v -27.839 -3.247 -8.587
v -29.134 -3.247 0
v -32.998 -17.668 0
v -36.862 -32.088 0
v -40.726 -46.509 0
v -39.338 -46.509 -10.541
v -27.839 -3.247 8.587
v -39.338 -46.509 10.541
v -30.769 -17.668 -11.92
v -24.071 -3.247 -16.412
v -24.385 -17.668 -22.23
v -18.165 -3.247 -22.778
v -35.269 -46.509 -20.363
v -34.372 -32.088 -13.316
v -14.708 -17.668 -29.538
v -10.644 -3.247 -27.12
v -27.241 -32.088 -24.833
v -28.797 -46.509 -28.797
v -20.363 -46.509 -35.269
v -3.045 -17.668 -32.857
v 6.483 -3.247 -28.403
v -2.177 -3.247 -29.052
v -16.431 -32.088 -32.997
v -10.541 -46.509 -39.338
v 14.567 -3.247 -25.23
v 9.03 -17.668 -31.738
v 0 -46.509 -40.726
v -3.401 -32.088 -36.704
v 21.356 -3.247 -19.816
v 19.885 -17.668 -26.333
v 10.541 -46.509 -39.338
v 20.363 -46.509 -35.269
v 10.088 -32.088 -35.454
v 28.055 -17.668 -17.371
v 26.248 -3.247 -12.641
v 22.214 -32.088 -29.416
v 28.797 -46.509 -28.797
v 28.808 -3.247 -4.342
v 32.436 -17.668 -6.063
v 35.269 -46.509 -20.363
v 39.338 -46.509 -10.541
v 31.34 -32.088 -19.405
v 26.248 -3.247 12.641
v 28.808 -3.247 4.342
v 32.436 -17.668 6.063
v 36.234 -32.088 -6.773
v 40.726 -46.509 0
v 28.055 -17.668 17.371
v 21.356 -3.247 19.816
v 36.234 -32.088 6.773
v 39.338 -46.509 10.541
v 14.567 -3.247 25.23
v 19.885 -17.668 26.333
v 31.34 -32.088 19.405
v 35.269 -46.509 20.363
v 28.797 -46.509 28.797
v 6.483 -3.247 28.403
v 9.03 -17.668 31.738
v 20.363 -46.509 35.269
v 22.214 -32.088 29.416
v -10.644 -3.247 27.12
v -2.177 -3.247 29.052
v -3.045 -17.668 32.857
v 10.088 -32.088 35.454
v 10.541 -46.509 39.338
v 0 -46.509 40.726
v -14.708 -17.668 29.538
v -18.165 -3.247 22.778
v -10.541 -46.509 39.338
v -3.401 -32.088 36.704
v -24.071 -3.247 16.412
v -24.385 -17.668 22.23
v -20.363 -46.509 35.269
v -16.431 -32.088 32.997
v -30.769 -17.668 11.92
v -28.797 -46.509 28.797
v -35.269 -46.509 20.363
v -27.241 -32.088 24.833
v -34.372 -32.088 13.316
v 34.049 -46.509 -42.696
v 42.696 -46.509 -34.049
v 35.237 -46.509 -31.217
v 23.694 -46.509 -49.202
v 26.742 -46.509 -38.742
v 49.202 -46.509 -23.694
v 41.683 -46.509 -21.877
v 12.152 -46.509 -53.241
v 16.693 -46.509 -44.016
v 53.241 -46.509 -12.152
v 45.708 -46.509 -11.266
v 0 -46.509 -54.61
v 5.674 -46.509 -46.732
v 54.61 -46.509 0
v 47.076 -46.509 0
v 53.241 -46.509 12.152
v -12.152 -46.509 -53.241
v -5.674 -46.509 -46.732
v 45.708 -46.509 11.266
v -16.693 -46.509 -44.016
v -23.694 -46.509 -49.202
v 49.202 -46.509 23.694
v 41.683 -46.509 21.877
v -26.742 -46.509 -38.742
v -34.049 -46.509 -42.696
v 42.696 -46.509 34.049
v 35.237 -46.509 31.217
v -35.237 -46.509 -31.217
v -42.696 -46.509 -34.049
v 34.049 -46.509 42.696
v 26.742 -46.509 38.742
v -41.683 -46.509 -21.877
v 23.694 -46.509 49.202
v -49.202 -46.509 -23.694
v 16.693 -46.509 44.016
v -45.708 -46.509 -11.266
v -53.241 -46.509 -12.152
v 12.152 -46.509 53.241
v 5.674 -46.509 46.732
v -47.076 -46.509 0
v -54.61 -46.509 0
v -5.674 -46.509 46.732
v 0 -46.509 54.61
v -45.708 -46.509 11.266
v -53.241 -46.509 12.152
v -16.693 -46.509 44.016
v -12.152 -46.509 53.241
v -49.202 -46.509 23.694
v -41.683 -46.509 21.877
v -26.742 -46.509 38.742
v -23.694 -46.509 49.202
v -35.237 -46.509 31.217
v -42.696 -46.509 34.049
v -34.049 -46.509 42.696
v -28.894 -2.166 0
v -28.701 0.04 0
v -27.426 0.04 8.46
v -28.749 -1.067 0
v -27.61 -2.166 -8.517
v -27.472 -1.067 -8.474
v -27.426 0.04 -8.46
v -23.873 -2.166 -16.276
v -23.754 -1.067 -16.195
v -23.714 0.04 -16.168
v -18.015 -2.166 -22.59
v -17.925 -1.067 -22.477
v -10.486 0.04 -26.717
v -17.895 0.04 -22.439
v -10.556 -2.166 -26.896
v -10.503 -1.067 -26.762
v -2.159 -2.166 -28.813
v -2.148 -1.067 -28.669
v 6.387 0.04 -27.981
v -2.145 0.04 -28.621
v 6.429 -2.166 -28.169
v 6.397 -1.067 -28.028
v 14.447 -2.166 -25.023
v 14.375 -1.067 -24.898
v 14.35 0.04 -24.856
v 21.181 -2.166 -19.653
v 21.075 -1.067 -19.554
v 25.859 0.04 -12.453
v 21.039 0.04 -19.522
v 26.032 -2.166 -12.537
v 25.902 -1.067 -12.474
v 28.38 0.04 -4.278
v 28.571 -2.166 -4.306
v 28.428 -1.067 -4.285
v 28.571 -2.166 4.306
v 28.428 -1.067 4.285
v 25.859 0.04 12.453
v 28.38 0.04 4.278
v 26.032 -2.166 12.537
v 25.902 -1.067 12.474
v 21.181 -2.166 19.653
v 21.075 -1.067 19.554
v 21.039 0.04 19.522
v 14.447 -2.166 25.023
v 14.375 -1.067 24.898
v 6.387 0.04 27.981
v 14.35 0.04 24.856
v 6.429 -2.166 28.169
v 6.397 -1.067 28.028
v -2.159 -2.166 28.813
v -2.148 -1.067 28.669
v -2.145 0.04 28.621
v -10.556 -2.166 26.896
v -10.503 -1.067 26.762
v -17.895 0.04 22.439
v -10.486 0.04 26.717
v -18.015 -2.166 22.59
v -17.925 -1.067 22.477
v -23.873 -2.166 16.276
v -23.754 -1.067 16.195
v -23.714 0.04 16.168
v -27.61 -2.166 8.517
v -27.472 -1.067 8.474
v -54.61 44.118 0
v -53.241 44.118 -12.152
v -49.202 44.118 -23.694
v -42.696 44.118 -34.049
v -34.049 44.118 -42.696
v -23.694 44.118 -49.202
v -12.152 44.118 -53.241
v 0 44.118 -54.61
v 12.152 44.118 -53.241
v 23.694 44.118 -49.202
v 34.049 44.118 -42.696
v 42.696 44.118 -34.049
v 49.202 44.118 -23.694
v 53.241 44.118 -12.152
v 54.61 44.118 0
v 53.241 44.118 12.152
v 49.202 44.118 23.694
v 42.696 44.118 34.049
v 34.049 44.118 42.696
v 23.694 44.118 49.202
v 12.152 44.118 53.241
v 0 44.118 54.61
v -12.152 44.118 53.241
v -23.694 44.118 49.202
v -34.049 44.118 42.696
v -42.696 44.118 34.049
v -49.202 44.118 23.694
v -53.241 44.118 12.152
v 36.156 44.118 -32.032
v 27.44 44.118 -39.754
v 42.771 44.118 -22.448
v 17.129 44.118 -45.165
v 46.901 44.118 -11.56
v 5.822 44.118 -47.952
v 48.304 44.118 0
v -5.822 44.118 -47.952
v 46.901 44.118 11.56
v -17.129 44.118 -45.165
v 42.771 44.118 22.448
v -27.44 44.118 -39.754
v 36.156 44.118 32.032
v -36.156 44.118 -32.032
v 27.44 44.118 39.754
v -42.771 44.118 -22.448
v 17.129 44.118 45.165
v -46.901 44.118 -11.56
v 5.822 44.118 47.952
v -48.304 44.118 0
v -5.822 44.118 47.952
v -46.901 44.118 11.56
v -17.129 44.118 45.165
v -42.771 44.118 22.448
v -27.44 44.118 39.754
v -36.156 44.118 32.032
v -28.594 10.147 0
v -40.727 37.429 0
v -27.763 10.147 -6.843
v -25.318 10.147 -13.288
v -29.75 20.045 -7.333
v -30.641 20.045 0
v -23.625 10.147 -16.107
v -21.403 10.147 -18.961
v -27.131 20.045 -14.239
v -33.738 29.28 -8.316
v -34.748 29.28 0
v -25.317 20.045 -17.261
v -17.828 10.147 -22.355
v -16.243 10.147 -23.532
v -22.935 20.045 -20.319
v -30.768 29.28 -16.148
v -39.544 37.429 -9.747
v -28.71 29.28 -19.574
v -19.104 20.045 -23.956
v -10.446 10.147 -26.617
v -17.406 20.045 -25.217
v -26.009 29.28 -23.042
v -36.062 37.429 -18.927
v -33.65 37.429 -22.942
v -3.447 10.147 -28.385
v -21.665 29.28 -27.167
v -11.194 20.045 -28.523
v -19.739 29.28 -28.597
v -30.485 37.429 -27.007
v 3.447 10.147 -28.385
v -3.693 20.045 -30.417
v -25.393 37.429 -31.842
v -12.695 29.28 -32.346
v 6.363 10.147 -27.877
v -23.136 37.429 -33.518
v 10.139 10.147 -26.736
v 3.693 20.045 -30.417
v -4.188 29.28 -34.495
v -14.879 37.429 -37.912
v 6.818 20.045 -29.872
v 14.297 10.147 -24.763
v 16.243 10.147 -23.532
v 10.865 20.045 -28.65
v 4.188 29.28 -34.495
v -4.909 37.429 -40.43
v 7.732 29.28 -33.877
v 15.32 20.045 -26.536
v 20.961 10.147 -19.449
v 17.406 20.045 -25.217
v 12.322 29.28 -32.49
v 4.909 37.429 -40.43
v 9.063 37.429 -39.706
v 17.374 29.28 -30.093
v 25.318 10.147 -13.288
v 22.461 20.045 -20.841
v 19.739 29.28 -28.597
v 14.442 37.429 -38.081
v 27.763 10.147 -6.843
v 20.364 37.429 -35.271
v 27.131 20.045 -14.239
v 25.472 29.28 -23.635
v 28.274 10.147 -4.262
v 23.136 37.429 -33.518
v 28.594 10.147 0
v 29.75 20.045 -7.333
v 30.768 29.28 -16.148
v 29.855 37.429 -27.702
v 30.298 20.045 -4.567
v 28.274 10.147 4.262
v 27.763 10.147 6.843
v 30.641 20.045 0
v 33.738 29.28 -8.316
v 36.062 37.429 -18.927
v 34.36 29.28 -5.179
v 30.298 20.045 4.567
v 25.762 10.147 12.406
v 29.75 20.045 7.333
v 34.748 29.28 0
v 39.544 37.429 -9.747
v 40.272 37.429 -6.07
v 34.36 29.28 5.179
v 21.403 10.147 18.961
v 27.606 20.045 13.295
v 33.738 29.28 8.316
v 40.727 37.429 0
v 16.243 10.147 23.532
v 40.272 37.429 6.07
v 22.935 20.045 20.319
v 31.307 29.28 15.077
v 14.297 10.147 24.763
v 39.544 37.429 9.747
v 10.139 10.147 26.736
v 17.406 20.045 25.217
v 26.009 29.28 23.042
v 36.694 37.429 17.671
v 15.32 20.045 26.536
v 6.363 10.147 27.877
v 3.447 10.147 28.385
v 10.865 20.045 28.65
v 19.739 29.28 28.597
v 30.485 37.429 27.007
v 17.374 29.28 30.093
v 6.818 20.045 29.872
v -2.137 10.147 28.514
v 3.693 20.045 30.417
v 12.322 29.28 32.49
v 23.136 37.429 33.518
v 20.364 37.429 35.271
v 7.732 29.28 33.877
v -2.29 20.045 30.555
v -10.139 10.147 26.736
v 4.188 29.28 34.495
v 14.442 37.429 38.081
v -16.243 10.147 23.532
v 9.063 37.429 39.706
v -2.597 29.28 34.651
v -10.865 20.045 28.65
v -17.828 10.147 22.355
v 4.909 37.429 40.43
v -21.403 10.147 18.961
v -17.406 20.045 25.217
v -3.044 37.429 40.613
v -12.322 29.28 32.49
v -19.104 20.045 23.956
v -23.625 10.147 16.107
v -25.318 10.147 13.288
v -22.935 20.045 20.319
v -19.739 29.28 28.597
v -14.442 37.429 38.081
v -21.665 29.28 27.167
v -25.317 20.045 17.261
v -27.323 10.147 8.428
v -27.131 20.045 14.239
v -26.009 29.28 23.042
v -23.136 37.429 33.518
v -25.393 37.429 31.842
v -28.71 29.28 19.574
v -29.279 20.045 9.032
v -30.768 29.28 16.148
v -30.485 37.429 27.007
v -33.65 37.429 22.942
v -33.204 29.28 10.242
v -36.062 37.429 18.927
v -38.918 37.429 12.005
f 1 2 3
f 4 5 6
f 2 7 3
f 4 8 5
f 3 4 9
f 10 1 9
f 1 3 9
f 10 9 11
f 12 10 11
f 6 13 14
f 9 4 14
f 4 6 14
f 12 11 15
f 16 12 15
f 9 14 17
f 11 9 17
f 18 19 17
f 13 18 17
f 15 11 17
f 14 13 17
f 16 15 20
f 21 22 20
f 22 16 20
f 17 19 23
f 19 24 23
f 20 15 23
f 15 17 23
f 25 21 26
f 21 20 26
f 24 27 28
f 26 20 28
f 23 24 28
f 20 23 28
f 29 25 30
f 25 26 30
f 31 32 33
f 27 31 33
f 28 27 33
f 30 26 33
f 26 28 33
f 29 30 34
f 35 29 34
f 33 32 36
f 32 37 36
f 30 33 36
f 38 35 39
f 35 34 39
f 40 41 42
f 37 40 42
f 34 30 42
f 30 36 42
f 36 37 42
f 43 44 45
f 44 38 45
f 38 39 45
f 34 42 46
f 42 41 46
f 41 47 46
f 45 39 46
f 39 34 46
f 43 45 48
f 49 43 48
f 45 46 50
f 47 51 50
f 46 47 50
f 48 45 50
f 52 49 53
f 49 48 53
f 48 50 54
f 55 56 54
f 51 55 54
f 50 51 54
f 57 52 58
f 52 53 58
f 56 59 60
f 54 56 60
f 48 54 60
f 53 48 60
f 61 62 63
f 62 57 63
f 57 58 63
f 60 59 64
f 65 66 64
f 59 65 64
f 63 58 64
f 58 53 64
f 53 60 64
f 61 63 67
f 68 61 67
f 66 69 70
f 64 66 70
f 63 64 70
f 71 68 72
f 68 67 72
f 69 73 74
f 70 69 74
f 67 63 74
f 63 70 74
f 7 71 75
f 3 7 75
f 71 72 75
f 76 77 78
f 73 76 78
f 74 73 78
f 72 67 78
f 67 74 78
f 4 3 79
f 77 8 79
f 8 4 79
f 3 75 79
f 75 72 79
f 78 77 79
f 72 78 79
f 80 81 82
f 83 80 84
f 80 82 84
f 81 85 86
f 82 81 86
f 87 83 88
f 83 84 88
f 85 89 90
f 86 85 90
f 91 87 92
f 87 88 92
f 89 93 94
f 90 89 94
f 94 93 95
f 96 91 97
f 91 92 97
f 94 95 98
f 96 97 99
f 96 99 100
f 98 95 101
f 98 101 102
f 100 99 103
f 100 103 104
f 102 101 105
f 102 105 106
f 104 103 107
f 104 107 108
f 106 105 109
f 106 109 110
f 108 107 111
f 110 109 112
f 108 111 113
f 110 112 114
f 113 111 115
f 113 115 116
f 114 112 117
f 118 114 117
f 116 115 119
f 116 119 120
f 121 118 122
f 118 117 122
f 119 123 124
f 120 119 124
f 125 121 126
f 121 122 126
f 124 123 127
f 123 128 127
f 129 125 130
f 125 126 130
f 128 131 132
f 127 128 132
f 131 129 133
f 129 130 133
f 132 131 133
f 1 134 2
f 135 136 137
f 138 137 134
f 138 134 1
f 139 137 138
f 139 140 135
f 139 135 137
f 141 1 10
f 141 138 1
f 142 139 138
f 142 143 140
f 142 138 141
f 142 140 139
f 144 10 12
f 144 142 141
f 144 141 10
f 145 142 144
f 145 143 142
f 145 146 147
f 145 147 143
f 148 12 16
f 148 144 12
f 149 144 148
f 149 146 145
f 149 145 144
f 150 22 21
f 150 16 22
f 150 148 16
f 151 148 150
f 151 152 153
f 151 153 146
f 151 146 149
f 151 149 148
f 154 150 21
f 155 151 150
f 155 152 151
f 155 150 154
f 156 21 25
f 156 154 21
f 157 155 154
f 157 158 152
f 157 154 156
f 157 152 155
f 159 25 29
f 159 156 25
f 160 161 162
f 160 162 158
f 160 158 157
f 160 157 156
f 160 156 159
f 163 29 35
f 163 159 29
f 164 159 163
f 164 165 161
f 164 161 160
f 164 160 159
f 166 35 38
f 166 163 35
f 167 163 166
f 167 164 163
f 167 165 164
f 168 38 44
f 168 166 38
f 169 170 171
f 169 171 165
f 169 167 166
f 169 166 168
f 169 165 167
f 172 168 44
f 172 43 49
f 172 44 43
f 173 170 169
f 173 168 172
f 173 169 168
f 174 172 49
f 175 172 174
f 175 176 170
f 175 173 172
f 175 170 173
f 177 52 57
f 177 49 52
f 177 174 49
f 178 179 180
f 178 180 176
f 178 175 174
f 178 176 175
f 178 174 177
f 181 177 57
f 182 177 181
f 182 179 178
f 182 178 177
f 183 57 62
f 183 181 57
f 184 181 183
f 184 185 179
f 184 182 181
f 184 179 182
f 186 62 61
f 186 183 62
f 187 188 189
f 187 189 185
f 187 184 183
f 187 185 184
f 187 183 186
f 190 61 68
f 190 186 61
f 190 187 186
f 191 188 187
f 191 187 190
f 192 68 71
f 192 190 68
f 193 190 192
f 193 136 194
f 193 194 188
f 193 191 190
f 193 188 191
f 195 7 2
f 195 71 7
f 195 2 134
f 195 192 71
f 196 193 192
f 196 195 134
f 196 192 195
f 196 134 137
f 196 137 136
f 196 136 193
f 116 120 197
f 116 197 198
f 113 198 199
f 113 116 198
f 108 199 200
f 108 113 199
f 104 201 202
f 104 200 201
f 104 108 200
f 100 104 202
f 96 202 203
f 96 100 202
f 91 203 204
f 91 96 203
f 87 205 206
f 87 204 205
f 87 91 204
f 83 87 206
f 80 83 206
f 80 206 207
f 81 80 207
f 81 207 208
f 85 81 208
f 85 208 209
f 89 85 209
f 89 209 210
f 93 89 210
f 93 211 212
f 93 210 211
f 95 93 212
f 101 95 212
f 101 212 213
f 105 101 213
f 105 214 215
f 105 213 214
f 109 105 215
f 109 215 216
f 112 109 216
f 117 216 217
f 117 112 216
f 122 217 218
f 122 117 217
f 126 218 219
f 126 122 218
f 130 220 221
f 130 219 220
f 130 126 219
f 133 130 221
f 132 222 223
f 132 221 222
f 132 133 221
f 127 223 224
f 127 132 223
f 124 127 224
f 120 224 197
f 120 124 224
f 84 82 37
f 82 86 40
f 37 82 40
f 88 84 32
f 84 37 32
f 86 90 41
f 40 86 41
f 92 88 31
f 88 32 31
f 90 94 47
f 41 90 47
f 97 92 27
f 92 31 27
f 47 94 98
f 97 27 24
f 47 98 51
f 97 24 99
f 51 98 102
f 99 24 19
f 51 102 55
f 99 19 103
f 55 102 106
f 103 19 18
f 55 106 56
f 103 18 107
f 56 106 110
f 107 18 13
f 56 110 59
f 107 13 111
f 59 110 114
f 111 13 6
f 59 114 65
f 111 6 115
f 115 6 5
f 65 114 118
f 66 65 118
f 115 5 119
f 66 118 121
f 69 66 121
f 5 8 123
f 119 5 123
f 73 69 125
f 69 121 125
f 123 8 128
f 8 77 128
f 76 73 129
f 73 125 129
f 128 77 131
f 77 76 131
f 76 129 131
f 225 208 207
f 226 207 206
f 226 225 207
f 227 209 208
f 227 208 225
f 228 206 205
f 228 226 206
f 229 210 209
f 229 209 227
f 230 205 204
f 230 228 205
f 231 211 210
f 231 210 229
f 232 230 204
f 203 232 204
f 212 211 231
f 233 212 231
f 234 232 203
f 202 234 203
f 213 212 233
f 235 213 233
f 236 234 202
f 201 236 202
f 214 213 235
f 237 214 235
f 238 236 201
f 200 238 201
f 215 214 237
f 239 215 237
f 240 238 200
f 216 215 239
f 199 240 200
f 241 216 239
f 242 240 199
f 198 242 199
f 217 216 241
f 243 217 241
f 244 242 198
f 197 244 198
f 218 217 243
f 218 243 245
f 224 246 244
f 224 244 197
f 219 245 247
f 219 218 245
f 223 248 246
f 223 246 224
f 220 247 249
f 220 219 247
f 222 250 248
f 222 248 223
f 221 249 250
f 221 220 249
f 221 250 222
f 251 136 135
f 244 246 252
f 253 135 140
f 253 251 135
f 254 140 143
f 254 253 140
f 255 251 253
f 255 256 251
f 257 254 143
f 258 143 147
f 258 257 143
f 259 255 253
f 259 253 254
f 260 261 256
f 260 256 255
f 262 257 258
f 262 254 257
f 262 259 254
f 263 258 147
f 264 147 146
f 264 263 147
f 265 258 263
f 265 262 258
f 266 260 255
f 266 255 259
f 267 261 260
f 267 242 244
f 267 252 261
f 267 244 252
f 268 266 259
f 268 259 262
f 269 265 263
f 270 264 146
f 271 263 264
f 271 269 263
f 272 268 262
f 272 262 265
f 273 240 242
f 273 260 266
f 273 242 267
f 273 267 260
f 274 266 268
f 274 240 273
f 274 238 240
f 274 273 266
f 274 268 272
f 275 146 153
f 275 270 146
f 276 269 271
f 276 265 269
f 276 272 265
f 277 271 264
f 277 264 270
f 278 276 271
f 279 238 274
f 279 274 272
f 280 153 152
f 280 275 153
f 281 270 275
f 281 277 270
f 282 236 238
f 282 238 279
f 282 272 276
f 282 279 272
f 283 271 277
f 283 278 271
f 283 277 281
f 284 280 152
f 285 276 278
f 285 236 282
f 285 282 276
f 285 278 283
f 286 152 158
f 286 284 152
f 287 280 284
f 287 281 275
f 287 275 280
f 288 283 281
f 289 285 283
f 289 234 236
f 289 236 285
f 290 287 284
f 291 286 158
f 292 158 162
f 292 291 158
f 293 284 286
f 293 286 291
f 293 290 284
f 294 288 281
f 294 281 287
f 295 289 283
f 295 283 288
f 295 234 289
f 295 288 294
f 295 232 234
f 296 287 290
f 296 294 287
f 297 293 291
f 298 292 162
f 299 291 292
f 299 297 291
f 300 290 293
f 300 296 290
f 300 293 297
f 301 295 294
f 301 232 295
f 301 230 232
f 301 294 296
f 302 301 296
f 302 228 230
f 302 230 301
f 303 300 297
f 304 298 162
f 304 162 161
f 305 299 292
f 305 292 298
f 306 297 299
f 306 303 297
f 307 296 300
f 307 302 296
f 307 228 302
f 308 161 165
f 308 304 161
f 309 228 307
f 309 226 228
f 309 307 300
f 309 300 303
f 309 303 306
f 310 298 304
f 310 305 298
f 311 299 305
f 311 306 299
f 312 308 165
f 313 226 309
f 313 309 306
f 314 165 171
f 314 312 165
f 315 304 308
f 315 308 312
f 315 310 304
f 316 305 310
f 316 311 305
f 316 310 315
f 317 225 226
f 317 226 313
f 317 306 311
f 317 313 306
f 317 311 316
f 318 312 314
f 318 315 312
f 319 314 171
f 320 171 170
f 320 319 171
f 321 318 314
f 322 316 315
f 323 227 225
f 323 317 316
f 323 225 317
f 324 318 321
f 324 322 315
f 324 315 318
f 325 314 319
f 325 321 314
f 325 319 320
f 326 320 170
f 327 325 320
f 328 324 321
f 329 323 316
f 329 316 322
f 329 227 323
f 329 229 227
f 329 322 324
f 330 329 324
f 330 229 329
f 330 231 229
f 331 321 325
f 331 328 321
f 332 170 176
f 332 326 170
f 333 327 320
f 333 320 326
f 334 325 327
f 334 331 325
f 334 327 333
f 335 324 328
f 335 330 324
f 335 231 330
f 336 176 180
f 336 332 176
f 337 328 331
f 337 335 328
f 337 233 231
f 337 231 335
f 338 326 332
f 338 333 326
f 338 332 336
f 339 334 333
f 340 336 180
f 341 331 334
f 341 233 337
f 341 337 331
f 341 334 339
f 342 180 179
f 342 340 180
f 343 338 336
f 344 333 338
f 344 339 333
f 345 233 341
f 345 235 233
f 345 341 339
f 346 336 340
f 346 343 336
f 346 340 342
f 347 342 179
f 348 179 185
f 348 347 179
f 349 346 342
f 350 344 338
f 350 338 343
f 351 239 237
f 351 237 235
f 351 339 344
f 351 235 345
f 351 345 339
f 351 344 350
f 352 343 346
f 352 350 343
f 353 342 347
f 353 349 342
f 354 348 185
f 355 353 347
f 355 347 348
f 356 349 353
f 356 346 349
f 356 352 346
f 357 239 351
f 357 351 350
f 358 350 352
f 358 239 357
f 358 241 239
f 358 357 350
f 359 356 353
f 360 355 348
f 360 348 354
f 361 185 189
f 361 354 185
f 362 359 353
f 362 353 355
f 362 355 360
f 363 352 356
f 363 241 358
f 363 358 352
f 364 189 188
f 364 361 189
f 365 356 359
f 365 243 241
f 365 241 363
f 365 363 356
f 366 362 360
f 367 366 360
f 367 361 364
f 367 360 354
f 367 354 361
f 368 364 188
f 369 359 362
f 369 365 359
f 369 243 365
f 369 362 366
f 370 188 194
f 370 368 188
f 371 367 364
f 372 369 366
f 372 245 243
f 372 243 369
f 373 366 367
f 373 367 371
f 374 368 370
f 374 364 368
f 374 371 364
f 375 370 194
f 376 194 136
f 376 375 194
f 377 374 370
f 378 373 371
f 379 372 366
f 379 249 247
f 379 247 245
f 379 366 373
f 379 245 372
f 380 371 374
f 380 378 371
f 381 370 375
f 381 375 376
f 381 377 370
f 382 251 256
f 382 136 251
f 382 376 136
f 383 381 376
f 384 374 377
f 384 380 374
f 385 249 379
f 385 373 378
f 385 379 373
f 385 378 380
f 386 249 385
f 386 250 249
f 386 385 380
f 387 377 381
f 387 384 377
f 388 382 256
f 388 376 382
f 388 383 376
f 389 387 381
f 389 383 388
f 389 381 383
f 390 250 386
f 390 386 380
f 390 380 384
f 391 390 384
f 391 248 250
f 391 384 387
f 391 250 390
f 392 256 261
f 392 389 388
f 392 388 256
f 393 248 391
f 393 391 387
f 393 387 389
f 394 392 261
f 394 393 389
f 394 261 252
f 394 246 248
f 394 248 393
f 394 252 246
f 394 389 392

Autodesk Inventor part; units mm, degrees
ref_plane "YZ Plane" through (0, 0, 0) normal (1, 0, 0) x (0, 1, 0)
ref_plane "XZ Plane" through (0, 0, 0) normal (0, 1, 0) x (-1, 0, 0)
ref_plane "XY Plane" through (0, 0, 0) normal (0, 0, 1) x (1, 0, 0)
sketch "Sketch1" plane through (0, 0, 0) normal (0, 0, 1) x (1, 0, 0)
  line L0 (-68.3895, -51.5874) -> (-9.652, -51.5874) construction
  line L1 (-54.61, 44.1185) -> (-48.3044, 44.1185)
  line L2 (-54.61, 44.1185) -> (-9.6509, 44.1185) construction
  line L3 (-54.61, 44.1185) -> (36.0172, 44.1185) construction
  line L4 (-75.5396, 46.8376) -> (-27.9582, 46.8376) construction
  line L5 (-75.5396, 46.8376) -> (-24.3567, 46.8376) construction
  line L6 (-75.5396, 46.8376) -> (-39.9094, 46.8376) construction
  line L7 (-85.2325, 14.4461) -> (-72.647, 14.4461)
  line L8 (-85.2325, 14.4461) -> (-78.8825, 14.4461)
  line L9 (-47.0755, -46.5087) -> (-40.7255, -46.5087)
  line L10 (-54.61, -46.5087) -> (-47.0755, -46.5087)
  arc A0 (-29.1336, -3.2472) -> (-28.7009, 0.0398) centre (-41.4009, 0.0398) ccw
  line L11 (-72.647, 14.4461) -> (-72.647, -49.0501)
  line L12 (-85.2325, 7.0204) -> (-85.2325, -49.0501)
  line L13 (-78.8825, 7.0204) -> (-85.2325, 7.0204)
  line L14 (-78.8825, 14.4461) -> (-78.8825, 7.0204)
  line L15 (-54.61, 44.1185) -> (-54.61, -46.5087)
  line L16 (-29.1336, -3.2472) -> (-78.2122, -186.4111)
  line L17 (-78.997, -110.2264) -> (-72.647, -110.2264)
  line L18 (-72.647, -141.9758) -> (-66.3058, -141.9758)
  line L19 (-78.997, -110.2264) -> (-78.997, -186.4111)
  line L20 (-72.647, -49.0501) -> (-85.2325, -49.0501)
  line L21 (-72.6469, -48.8475) -> (-59.9469, -48.8475) construction
  line L22 (-85.2325, 26.3534) -> (-71.1236, 26.3534)
  line L23 (-71.1236, 26.3534) -> (-64.7736, 26.3534)
  line L24 (-64.7736, 26.3534) -> (-64.7736, -49.0592)
  line L25 (-64.7736, -49.0592) -> (-64.7736, -112.5592)
  line L26 (-64.7736, -112.5592) -> (-58.4236, -112.5592)
  line L27 (-85.2325, 26.3534) -> (-85.2325, 42.2284)
  line L28 (-85.2325, 42.2284) -> (-78.2952, 42.2284)
  line L29 (-78.2952, 42.2284) -> (-78.2952, 58.1034)
  line L30 (-78.2952, 58.1034) -> (-48.3044, 44.1185)
  line L31 (-77.6767, 58.2932) -> (49.3233, 58.2932) construction
  arc A1 (-28.7009, 0.0398) -> (-48.3044, 44.1185) centre (-75.5766, 5.5909) ccw
  line L32 (-78.997, -186.4111) -> (-78.2122, -186.4111)
  line L33 (-72.6558, -49.0501) -> (-72.647, -49.0501)
  line L34 (-85.2325, 26.3534) -> (-85.2325, 14.4461)
  line L35 (-72.647, -49.0501) -> (-72.647, -110.2264)
  line L36 (-72.647, -110.2264) -> (-72.647, -141.9758)
  line L37 (0, -235.352) -> (0, 107.2341) projected
  point P0 (0, 0)
  point P1 (-9.6509, 0.0398)
  dimension "d5" = 12.7
  dimension "d7" = 6.35
  dimension "d8" = 105
  dimension "d23" = 76.1847
  dimension "d26" = 31.7495
  dimension "d30" = 90
  dimension "d33" = 6.35
  dimension "d51" = 6.35
  dimension "d54" = 6.35
  dimension "d55" = 15.875
  dimension "d56" = 6.9374
  dimension "d57" = 15.875
  dimension "d60" = 25
  dimension "d62" = 28.7008
  dimension "d63" = 54.61
  dimension "d64" = 6.3056
revolve "Revolution1" add sketch "Sketch1" angle 360 about axis through (0, -10, 0) along (0, 1, 0) contours L1 A1 A0 L16 L9 L10 L15
properties part number "nozzle 8in version 1"
